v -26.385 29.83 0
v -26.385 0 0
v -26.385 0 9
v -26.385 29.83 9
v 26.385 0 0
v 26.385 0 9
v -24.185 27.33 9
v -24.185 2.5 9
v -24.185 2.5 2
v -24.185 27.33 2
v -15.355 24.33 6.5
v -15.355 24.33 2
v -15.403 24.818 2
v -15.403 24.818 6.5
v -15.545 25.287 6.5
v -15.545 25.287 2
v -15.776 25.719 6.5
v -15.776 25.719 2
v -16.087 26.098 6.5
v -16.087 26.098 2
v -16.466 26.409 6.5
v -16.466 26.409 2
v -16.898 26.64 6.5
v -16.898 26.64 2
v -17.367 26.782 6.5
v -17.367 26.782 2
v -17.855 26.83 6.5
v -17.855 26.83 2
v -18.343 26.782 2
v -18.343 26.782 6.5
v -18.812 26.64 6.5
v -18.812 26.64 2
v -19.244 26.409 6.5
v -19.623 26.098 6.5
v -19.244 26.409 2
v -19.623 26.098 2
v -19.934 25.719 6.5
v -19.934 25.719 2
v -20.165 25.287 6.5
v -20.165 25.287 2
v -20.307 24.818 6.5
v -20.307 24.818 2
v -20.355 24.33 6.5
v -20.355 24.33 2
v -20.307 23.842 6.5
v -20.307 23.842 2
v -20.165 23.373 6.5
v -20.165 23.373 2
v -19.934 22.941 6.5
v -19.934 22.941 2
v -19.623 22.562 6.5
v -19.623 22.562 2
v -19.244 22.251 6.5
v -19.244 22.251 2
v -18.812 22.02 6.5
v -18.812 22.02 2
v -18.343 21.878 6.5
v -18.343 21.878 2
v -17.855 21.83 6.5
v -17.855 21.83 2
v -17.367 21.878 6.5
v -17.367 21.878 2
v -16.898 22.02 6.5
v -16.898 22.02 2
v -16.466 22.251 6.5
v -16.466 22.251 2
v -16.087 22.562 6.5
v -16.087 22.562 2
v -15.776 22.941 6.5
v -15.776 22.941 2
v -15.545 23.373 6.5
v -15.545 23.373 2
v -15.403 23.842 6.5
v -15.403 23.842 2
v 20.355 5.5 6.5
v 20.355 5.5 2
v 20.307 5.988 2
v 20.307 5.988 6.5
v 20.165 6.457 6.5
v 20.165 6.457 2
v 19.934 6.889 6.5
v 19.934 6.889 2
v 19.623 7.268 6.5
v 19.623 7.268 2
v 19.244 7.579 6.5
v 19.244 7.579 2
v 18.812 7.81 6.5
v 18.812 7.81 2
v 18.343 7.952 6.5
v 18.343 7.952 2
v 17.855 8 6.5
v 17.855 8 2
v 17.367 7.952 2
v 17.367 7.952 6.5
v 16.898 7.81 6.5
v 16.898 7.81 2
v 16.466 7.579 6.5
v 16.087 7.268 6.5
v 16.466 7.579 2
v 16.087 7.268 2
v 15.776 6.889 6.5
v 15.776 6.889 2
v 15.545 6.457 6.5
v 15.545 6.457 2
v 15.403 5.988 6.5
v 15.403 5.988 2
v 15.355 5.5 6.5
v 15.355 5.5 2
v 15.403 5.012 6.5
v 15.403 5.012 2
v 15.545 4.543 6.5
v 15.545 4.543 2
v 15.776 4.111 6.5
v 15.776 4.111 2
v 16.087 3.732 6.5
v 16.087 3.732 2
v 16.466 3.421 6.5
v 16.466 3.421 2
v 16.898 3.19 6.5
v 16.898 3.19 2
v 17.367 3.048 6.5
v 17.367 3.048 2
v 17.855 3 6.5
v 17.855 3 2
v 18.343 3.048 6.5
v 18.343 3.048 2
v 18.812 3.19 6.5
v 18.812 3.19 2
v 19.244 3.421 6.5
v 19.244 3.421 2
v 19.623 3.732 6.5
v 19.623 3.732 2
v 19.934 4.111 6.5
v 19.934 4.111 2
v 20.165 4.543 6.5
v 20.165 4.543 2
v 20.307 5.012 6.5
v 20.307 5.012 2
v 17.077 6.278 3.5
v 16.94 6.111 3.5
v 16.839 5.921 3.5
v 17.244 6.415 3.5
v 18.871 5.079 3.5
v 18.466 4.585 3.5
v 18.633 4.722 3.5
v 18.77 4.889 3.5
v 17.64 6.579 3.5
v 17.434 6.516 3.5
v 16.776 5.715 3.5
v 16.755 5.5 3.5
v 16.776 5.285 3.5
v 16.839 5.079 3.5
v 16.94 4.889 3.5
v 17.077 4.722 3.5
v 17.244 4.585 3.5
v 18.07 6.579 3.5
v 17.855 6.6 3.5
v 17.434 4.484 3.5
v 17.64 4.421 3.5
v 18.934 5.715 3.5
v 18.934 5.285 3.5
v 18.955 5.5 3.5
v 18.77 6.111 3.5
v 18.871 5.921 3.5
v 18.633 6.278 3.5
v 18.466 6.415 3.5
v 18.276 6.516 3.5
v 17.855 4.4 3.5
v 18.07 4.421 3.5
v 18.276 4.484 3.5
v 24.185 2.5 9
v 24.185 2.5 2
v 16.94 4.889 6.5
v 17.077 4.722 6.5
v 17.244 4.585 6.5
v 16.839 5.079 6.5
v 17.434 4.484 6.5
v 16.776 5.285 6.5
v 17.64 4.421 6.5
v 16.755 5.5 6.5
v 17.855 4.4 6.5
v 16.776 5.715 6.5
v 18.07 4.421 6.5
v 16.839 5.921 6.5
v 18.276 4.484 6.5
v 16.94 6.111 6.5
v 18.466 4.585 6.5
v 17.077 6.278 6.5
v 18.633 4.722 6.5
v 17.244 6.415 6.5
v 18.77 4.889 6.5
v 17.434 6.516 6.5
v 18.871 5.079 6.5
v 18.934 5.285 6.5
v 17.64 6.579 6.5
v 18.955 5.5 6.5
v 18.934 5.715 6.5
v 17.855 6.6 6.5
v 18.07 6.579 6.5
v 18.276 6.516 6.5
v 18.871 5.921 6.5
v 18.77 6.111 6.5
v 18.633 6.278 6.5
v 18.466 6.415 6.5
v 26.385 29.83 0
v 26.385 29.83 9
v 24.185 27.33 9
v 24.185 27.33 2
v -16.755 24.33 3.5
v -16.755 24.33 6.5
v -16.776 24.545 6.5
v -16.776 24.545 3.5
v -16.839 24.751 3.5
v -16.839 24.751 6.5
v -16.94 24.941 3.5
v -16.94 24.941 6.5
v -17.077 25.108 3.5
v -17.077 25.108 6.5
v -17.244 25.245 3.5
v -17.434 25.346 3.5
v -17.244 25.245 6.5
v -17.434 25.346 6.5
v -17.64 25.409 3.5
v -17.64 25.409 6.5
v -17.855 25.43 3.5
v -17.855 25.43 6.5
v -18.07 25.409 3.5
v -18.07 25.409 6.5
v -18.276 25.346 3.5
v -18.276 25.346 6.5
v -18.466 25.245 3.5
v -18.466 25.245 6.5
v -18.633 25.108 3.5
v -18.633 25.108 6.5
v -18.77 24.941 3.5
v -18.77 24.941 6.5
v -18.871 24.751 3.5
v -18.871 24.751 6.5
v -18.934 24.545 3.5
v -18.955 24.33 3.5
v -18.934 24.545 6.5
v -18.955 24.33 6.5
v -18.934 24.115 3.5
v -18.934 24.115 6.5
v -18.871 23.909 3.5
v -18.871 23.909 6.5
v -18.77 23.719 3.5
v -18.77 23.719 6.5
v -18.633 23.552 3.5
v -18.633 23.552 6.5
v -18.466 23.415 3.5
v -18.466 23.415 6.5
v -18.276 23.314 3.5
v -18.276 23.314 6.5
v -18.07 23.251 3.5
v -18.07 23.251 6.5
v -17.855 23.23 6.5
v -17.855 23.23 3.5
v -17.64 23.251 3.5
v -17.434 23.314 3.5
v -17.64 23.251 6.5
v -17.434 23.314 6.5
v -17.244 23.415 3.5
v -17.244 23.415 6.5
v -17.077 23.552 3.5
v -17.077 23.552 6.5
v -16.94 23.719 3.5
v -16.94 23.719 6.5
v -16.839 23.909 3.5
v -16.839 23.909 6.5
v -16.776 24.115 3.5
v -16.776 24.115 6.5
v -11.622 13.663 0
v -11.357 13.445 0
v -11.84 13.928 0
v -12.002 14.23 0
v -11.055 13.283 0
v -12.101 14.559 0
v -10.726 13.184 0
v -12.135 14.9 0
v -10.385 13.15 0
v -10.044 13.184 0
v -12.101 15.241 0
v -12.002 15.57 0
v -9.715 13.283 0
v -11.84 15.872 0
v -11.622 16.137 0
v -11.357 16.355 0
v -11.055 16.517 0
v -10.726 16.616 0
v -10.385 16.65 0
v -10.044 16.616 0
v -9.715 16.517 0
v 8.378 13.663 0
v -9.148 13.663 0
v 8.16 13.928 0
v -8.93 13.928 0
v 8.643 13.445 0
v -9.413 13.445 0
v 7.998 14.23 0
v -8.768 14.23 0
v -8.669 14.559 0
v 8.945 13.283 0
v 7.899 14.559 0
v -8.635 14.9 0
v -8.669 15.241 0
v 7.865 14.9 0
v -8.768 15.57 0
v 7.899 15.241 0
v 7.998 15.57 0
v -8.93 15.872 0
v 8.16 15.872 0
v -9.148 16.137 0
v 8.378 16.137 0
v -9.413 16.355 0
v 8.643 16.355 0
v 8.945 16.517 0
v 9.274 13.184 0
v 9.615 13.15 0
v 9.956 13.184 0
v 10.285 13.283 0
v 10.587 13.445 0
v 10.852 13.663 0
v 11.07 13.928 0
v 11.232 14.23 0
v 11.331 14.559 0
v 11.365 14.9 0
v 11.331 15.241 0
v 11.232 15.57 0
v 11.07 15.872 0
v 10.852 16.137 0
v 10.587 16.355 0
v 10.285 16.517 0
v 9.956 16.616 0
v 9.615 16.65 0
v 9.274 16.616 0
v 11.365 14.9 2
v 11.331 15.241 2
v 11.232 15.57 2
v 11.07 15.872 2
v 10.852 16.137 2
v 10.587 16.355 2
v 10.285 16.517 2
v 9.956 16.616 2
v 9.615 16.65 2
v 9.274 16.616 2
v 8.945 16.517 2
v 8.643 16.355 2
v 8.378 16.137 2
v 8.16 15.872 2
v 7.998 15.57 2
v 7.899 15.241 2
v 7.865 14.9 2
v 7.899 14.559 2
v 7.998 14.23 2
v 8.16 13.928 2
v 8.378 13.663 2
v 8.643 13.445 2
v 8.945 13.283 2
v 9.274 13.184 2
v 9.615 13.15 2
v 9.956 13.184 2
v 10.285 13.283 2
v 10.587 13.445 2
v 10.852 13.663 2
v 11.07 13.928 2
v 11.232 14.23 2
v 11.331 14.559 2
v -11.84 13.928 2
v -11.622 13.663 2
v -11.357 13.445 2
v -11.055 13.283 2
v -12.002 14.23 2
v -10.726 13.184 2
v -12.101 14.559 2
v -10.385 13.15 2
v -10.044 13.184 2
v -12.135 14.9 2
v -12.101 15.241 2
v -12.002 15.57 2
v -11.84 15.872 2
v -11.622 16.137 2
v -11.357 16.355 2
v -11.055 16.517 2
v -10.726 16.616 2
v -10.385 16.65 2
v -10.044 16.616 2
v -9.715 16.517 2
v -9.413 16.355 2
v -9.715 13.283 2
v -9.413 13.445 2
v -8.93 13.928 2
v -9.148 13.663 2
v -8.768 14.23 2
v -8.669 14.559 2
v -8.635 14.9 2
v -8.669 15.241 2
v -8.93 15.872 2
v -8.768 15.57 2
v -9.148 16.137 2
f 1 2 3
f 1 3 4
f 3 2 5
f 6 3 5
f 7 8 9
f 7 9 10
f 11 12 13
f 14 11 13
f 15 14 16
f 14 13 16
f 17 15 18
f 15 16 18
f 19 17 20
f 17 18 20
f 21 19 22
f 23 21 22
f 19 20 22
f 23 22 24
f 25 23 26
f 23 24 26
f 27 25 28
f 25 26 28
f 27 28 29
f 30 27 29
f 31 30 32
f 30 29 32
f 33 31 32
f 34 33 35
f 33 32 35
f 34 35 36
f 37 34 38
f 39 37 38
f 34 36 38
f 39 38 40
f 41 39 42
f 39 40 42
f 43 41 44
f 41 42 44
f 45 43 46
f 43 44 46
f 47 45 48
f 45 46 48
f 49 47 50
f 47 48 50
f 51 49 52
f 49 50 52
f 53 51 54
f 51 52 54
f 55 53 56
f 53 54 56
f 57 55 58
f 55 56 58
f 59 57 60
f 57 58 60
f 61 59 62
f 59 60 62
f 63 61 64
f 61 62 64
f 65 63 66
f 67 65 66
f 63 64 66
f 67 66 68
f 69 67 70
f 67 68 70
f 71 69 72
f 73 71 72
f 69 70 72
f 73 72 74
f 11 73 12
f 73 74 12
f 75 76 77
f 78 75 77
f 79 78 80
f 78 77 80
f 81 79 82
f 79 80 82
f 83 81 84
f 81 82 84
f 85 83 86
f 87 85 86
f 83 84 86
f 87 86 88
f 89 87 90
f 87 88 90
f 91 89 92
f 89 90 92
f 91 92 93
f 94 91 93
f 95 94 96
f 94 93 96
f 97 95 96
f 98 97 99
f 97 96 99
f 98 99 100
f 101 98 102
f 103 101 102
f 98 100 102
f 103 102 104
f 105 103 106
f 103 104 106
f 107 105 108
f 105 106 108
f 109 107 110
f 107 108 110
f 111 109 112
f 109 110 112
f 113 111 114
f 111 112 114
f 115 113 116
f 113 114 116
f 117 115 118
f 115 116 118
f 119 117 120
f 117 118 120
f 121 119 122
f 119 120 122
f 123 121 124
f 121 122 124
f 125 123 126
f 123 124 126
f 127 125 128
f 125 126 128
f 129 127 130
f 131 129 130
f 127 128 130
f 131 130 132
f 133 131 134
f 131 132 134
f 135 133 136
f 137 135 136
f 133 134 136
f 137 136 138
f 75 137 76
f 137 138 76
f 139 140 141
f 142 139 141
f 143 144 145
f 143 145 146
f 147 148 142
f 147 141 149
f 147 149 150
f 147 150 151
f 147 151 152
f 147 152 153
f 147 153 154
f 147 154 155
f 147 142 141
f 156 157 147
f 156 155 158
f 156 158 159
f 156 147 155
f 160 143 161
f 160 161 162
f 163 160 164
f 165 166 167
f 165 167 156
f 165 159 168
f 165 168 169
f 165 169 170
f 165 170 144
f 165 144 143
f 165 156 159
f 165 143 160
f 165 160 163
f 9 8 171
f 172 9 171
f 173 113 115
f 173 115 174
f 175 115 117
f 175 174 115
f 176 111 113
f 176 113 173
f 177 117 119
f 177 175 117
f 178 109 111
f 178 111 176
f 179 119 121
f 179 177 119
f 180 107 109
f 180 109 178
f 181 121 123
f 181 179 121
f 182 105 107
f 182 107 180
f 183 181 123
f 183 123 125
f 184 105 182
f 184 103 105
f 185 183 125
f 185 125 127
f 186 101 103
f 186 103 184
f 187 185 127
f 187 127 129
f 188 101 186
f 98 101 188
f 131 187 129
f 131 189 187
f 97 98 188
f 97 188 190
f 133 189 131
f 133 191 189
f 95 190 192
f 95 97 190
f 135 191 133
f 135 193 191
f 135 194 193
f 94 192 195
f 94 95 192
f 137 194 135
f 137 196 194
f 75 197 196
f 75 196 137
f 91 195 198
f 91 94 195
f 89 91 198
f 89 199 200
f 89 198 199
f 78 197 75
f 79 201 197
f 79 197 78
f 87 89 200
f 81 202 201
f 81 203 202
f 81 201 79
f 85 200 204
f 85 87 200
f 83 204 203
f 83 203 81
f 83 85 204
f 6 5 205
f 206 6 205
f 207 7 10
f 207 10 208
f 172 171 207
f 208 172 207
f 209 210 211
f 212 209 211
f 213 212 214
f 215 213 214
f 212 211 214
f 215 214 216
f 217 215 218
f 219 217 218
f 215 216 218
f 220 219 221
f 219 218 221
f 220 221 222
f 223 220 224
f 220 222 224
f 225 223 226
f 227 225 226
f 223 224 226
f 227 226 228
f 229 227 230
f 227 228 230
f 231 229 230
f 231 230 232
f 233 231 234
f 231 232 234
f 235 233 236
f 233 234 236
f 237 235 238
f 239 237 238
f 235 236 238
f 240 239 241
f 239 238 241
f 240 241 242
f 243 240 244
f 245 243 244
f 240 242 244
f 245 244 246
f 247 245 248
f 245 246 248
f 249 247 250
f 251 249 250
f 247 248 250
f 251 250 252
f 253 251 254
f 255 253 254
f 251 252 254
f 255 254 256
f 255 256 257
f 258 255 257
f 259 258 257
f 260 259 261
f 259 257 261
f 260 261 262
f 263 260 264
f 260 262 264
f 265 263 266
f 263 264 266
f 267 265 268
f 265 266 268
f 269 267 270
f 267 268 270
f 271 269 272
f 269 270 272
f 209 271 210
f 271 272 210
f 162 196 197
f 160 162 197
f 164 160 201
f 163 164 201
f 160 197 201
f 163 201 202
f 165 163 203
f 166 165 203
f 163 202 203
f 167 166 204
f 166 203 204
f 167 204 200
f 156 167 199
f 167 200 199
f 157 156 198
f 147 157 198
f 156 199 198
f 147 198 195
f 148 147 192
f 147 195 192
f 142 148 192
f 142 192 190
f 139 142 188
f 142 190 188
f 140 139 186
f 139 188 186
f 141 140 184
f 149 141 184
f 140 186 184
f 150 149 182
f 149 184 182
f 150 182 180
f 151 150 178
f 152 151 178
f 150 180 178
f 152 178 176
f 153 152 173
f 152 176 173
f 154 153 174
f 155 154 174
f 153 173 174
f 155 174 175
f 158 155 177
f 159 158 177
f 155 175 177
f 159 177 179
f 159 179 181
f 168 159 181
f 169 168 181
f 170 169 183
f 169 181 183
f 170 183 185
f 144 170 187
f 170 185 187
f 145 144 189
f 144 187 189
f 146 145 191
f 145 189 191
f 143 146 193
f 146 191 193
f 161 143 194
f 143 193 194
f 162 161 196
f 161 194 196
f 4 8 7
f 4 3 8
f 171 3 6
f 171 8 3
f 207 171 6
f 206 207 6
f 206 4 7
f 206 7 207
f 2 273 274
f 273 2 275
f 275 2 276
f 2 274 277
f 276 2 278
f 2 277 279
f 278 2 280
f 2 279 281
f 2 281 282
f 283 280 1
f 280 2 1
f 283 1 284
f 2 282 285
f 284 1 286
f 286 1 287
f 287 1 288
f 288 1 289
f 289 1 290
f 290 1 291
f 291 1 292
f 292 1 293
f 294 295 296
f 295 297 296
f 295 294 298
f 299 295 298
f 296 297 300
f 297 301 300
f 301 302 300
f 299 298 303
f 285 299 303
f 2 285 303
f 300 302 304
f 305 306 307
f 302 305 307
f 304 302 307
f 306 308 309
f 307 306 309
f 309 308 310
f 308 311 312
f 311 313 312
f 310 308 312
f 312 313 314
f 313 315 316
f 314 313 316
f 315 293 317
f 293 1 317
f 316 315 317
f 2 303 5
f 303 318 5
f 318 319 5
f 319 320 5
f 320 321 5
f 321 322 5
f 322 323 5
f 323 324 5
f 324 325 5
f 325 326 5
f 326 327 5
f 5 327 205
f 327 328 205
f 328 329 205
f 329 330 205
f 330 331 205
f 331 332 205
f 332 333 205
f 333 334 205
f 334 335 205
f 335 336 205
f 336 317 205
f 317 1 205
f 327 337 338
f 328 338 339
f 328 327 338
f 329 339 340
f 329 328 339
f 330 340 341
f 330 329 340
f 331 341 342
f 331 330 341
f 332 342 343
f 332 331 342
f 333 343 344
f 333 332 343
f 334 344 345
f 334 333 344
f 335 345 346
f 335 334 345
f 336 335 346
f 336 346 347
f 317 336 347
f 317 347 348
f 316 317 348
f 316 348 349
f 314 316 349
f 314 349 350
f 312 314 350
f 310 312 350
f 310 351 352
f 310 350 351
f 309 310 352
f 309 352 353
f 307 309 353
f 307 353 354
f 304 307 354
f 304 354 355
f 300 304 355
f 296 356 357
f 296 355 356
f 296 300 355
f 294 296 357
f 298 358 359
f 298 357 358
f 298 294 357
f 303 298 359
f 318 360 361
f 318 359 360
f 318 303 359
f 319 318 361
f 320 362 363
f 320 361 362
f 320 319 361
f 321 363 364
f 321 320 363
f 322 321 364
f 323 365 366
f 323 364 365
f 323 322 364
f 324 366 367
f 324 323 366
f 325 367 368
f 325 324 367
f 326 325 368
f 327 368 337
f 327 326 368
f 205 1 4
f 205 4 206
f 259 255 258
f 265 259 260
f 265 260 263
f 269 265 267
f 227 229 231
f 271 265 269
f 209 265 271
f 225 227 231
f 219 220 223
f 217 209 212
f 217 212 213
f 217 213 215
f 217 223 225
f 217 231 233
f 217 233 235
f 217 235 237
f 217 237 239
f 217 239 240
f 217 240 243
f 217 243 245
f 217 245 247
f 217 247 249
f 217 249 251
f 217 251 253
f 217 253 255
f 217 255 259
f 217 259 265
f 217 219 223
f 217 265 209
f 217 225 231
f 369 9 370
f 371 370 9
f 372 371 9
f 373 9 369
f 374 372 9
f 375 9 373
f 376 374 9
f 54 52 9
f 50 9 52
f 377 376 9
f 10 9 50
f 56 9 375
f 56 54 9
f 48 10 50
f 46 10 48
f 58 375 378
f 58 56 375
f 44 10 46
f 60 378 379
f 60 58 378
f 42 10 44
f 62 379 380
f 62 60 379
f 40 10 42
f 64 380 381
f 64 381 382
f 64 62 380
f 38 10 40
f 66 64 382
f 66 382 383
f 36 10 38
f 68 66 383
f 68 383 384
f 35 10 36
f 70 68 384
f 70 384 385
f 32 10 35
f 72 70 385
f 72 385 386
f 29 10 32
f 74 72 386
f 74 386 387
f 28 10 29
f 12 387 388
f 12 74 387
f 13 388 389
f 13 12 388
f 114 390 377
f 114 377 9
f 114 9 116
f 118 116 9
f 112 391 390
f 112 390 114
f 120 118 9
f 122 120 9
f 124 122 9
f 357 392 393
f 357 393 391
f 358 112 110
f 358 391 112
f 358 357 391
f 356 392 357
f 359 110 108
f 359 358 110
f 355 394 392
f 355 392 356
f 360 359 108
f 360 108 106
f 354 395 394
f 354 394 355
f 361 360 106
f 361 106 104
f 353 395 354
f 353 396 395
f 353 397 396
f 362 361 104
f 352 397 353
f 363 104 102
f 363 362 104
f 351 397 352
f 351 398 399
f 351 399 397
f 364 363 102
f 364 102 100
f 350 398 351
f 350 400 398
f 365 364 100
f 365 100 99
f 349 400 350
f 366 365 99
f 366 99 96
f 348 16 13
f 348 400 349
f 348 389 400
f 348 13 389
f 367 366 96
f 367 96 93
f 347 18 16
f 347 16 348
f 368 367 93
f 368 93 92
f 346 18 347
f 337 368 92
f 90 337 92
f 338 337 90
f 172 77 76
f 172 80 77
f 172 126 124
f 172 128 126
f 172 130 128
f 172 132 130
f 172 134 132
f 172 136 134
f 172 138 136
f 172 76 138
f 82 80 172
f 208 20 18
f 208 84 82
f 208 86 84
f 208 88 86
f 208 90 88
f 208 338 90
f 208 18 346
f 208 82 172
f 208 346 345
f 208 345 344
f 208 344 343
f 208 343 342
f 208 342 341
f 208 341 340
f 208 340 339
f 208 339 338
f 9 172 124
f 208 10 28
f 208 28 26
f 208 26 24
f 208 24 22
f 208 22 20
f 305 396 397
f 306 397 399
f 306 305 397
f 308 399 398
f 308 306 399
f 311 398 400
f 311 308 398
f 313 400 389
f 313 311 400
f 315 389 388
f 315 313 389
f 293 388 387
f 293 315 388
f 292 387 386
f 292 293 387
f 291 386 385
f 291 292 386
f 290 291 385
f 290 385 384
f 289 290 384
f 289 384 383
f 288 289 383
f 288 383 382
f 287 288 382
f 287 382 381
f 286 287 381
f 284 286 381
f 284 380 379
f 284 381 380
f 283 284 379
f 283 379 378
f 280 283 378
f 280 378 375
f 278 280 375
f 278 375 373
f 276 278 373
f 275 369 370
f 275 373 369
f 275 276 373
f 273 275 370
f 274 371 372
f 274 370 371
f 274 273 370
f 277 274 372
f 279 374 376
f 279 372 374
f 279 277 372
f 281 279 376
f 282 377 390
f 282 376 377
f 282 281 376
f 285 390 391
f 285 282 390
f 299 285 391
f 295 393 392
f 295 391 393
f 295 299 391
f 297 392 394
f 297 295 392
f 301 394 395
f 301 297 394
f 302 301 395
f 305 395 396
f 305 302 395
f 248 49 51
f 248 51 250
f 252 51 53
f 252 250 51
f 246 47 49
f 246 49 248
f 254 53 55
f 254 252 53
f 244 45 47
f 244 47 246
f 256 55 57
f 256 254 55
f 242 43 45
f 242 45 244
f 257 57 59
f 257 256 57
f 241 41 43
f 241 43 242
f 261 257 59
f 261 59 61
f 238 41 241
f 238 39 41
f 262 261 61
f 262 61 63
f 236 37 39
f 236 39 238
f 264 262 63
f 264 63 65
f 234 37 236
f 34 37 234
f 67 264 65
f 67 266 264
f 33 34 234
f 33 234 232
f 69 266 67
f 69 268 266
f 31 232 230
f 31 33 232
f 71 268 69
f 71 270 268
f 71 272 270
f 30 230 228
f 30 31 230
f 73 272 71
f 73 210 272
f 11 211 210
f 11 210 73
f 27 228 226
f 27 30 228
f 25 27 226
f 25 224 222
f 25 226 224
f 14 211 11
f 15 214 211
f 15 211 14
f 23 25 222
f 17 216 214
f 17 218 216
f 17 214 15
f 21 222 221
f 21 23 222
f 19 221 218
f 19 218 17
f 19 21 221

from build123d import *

# Parameters (mm, degrees)
SKETCH_W        = 52.77
SKETCH_H        = 29.83
SKETCH_R        = 1.75
PAD_DEPTH       = 9
SKETCH001_W     = 48.37
SKETCH001_H     = 24.83
POCKET_DEPTH    = 7
SKETCH002_R     = 2.5
PAD001_DEPTH    = 4.5
SKETCH003_R     = 1.1
POCKET001_DEPTH = 3
SKETCH004_R     = 2.5
PAD002_DEPTH    = 4.5
SKETCH005_R     = 1.1
POCKET002_DEPTH = 3


with BuildPart() as part:
    # Sketch → Pad (new body)
    with BuildSketch(Plane.XY):
        with Locations((0, 14.915)):
            Rectangle(SKETCH_W, SKETCH_H)
        with Locations((-10.385, 14.9)):
            Circle(SKETCH_R, mode=Mode.SUBTRACT)
        with Locations((9.615, 14.9)):
            Circle(SKETCH_R, mode=Mode.SUBTRACT)
    extrude(amount=PAD_DEPTH)

    # Sketch001 (on Face8 of Pad) → Pocket (cut)
    with BuildSketch(Plane.XY.offset(9)):
        with Locations((0, 14.915)):
            Rectangle(SKETCH001_W, SKETCH001_H)
    extrude(amount=-POCKET_DEPTH, mode=Mode.SUBTRACT)

    # Sketch002 (on Face13 of Pocket) → Pad001 (join)
    with BuildSketch(Plane.XY.offset(2)):
        with Locations((-17.855, 24.33)):
            Circle(SKETCH002_R)
    extrude(amount=PAD001_DEPTH)

    # Sketch003 (on Face15 of Pad001) → Pocket001 (cut)
    with BuildSketch(Plane.XY.offset(6.5)):
        with Locations((-17.855, 24.33)):
            Circle(SKETCH003_R)
    extrude(amount=-POCKET001_DEPTH, mode=Mode.SUBTRACT)

    # Sketch004 (on Face13 of Pocket001) → Pad002 (join)
    with BuildSketch(Plane.XY.offset(2)):
        with Locations((17.855, 5.5)):
            Circle(SKETCH004_R)
    extrude(amount=PAD002_DEPTH)

    # Sketch005 (on Face16 of Pad002) → Pocket002 (cut)
    with BuildSketch(Plane.XY.offset(6.5)):
        with Locations((17.855, 5.5)):
            Circle(SKETCH005_R)
    extrude(amount=-POCKET002_DEPTH, mode=Mode.SUBTRACT)


solid = part.part
